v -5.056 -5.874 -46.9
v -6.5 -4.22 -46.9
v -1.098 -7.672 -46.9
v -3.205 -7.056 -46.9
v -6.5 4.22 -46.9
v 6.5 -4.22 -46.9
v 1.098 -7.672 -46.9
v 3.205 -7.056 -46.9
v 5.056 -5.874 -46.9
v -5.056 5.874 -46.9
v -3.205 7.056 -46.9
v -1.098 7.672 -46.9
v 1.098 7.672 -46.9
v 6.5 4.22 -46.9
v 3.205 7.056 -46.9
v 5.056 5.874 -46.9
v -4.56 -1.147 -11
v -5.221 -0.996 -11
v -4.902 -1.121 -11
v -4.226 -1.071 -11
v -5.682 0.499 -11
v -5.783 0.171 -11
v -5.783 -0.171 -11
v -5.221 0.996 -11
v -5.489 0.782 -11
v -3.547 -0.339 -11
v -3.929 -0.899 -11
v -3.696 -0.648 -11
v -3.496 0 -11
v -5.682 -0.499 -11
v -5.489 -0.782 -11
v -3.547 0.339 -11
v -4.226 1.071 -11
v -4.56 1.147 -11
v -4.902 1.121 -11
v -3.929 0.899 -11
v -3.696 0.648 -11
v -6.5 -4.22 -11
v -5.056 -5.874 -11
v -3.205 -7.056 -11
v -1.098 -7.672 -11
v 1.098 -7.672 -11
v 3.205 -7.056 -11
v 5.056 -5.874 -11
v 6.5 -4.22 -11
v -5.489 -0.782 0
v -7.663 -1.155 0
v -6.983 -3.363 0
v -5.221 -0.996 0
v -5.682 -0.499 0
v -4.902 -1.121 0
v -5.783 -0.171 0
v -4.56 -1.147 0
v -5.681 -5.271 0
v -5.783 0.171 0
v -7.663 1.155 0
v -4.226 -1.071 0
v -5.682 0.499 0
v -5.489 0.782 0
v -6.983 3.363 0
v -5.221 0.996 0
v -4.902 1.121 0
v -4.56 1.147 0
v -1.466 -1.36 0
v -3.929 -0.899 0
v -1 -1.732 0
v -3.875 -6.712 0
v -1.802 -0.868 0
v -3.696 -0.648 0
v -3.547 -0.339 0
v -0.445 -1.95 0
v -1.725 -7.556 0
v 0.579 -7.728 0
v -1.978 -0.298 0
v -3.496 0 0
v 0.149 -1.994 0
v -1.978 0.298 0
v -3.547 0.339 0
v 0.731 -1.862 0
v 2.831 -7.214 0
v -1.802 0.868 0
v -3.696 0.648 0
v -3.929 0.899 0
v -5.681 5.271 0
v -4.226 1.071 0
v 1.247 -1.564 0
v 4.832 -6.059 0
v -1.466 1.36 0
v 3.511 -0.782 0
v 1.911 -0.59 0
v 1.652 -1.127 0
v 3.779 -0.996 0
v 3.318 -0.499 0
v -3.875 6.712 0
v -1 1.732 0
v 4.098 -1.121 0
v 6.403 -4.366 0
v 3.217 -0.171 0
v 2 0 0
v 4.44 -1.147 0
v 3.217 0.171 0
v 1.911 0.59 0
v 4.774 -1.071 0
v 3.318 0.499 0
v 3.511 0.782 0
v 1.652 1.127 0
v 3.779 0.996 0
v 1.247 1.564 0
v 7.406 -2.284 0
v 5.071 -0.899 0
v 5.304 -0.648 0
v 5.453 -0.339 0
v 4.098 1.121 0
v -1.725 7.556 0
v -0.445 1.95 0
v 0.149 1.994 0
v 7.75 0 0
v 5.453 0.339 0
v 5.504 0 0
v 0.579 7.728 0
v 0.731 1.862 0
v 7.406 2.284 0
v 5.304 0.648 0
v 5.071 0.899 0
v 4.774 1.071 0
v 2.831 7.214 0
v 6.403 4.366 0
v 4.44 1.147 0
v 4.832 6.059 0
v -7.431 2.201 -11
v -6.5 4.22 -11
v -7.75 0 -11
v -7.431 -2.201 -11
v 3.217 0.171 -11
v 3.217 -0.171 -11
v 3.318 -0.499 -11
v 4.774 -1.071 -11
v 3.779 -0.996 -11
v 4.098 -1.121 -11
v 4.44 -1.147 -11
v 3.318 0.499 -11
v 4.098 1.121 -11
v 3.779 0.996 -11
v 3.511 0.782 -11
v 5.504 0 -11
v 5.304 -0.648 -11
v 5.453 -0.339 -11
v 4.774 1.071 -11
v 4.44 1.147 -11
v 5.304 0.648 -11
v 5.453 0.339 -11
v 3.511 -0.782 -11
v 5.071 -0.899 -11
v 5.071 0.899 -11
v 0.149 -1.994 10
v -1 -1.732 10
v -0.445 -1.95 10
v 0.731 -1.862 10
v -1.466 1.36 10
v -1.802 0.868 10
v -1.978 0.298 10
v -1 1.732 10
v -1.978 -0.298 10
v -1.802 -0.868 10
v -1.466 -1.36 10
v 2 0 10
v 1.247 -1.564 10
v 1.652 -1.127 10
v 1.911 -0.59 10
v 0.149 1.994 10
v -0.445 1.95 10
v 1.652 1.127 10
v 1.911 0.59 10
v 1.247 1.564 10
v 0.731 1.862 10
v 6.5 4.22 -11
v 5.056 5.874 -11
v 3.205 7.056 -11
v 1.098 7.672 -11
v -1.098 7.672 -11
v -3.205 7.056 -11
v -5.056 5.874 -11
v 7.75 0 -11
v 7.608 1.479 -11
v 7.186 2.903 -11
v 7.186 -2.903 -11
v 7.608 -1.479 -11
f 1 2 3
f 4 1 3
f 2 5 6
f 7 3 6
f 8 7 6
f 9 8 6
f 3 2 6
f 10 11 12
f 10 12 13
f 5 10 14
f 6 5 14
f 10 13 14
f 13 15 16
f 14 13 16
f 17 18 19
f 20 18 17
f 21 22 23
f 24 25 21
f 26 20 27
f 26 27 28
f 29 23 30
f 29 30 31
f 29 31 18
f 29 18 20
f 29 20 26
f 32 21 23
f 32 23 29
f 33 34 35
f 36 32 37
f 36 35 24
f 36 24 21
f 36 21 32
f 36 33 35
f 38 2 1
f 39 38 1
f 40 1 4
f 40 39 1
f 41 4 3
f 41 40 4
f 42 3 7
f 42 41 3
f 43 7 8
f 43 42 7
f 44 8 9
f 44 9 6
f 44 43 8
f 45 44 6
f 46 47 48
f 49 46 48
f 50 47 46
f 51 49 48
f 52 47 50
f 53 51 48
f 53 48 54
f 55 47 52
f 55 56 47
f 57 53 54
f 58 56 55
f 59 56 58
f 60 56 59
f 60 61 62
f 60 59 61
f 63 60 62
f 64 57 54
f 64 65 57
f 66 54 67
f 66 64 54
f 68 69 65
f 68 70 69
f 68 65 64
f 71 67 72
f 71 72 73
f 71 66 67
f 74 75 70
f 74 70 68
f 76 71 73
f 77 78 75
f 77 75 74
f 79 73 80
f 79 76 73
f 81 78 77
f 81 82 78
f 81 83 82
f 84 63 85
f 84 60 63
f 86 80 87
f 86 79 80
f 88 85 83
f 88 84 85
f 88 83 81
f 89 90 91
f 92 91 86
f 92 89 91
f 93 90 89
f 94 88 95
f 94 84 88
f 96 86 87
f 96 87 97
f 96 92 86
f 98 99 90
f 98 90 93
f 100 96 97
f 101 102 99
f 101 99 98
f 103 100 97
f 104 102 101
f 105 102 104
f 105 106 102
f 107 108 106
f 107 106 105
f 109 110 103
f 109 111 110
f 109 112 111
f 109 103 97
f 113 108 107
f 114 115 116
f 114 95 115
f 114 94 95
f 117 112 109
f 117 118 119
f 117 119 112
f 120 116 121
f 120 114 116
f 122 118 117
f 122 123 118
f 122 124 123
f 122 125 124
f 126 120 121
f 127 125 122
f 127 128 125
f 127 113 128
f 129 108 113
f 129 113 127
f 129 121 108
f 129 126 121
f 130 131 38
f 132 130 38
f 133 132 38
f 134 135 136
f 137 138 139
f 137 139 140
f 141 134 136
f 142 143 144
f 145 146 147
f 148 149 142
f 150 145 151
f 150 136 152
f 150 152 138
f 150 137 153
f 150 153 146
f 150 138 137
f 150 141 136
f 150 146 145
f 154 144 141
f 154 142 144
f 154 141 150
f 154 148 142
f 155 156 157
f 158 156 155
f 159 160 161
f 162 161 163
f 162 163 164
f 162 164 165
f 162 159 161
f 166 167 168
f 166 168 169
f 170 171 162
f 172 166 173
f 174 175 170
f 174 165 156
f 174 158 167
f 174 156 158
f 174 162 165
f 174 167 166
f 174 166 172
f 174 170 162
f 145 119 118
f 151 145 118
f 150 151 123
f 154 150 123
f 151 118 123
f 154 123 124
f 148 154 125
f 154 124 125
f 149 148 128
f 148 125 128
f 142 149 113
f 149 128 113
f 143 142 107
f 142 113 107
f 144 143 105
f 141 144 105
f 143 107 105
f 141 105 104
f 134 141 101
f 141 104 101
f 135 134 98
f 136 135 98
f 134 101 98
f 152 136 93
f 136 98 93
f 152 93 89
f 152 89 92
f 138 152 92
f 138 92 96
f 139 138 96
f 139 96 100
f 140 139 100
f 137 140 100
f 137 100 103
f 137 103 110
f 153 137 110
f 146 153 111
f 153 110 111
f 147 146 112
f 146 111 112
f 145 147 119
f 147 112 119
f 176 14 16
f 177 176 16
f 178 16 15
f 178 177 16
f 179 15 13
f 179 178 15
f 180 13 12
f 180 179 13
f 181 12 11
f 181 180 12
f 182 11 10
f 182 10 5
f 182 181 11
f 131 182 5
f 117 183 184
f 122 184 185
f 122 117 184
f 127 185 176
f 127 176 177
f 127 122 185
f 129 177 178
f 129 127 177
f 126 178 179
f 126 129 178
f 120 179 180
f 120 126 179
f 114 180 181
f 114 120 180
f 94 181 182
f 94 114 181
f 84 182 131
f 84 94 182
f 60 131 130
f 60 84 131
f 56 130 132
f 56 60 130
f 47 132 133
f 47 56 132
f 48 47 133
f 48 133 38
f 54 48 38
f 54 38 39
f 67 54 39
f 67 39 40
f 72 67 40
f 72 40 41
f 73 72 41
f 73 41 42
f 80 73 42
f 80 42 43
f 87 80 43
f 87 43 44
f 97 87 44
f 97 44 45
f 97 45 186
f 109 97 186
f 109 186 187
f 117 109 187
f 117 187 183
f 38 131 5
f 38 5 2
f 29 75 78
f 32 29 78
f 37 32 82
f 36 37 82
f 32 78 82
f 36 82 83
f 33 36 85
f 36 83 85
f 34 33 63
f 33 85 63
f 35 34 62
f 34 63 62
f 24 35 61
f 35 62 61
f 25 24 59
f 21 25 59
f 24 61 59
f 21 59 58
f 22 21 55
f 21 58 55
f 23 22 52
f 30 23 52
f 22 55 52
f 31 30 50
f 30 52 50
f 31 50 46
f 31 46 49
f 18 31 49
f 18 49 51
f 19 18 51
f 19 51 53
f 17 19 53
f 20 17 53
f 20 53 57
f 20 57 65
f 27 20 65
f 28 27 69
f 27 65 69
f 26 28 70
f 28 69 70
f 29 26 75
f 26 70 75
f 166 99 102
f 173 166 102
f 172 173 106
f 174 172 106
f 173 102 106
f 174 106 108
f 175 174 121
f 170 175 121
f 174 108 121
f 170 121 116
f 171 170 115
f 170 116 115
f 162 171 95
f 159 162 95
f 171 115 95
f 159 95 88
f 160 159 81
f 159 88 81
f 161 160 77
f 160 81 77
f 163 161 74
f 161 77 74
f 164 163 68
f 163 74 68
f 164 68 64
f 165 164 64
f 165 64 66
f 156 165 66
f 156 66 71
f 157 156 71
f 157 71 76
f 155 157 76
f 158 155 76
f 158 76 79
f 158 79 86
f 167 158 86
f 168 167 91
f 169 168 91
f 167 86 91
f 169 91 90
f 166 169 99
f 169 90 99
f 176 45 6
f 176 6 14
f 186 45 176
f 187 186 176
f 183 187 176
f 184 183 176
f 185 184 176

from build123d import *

# Parameters (mm, degrees)
SKETCH_1_R      = 7.75
SKETCH_1_R_2    = 1.15
EXTRUDE_1_DEPTH = 11
EXTRUDE_2_DEPTH = 35.9
SKETCH_3_R      = 2
EXTRUDE_3_DEPTH = 10


with BuildPart() as part:
    # 草图1 → 凸台-拉伸1 (new body)
    with BuildSketch(Plane.XY):
        Circle(SKETCH_1_R)
        with Locations((4.353856496, 0)):
            Circle(SKETCH_1_R_2, mode=Mode.SUBTRACT)
        with Locations((-4.646143504, 0)):
            Circle(SKETCH_1_R_2, mode=Mode.SUBTRACT)
    extrude(amount=-EXTRUDE_1_DEPTH)

    # 草图2 → 凸台-拉伸2 (add)
    with BuildSketch(Plane(origin=(0, 0, -11), x_dir=(-1, 0, 0), z_dir=(0, 0, -1))):
        with BuildLine():
            Line((6.5, 4.220485754), (6.5, -4.220485754))
            ThreePointArc((6.5, -4.220485754), (0, -7.75), (-6.5, -4.220485754))
            Line((-6.5, -4.220485754), (-6.5, 4.220485754))
            ThreePointArc((-6.5, 4.220485754), (0, 7.75), (6.5, 4.220485754))
        make_face()
    extrude(amount=EXTRUDE_2_DEPTH)

    # 草图3 → 凸台-拉伸3 (add)
    with BuildSketch(Plane.XY):
        Circle(SKETCH_3_R)
    extrude(amount=EXTRUDE_3_DEPTH)


solid = part.part
